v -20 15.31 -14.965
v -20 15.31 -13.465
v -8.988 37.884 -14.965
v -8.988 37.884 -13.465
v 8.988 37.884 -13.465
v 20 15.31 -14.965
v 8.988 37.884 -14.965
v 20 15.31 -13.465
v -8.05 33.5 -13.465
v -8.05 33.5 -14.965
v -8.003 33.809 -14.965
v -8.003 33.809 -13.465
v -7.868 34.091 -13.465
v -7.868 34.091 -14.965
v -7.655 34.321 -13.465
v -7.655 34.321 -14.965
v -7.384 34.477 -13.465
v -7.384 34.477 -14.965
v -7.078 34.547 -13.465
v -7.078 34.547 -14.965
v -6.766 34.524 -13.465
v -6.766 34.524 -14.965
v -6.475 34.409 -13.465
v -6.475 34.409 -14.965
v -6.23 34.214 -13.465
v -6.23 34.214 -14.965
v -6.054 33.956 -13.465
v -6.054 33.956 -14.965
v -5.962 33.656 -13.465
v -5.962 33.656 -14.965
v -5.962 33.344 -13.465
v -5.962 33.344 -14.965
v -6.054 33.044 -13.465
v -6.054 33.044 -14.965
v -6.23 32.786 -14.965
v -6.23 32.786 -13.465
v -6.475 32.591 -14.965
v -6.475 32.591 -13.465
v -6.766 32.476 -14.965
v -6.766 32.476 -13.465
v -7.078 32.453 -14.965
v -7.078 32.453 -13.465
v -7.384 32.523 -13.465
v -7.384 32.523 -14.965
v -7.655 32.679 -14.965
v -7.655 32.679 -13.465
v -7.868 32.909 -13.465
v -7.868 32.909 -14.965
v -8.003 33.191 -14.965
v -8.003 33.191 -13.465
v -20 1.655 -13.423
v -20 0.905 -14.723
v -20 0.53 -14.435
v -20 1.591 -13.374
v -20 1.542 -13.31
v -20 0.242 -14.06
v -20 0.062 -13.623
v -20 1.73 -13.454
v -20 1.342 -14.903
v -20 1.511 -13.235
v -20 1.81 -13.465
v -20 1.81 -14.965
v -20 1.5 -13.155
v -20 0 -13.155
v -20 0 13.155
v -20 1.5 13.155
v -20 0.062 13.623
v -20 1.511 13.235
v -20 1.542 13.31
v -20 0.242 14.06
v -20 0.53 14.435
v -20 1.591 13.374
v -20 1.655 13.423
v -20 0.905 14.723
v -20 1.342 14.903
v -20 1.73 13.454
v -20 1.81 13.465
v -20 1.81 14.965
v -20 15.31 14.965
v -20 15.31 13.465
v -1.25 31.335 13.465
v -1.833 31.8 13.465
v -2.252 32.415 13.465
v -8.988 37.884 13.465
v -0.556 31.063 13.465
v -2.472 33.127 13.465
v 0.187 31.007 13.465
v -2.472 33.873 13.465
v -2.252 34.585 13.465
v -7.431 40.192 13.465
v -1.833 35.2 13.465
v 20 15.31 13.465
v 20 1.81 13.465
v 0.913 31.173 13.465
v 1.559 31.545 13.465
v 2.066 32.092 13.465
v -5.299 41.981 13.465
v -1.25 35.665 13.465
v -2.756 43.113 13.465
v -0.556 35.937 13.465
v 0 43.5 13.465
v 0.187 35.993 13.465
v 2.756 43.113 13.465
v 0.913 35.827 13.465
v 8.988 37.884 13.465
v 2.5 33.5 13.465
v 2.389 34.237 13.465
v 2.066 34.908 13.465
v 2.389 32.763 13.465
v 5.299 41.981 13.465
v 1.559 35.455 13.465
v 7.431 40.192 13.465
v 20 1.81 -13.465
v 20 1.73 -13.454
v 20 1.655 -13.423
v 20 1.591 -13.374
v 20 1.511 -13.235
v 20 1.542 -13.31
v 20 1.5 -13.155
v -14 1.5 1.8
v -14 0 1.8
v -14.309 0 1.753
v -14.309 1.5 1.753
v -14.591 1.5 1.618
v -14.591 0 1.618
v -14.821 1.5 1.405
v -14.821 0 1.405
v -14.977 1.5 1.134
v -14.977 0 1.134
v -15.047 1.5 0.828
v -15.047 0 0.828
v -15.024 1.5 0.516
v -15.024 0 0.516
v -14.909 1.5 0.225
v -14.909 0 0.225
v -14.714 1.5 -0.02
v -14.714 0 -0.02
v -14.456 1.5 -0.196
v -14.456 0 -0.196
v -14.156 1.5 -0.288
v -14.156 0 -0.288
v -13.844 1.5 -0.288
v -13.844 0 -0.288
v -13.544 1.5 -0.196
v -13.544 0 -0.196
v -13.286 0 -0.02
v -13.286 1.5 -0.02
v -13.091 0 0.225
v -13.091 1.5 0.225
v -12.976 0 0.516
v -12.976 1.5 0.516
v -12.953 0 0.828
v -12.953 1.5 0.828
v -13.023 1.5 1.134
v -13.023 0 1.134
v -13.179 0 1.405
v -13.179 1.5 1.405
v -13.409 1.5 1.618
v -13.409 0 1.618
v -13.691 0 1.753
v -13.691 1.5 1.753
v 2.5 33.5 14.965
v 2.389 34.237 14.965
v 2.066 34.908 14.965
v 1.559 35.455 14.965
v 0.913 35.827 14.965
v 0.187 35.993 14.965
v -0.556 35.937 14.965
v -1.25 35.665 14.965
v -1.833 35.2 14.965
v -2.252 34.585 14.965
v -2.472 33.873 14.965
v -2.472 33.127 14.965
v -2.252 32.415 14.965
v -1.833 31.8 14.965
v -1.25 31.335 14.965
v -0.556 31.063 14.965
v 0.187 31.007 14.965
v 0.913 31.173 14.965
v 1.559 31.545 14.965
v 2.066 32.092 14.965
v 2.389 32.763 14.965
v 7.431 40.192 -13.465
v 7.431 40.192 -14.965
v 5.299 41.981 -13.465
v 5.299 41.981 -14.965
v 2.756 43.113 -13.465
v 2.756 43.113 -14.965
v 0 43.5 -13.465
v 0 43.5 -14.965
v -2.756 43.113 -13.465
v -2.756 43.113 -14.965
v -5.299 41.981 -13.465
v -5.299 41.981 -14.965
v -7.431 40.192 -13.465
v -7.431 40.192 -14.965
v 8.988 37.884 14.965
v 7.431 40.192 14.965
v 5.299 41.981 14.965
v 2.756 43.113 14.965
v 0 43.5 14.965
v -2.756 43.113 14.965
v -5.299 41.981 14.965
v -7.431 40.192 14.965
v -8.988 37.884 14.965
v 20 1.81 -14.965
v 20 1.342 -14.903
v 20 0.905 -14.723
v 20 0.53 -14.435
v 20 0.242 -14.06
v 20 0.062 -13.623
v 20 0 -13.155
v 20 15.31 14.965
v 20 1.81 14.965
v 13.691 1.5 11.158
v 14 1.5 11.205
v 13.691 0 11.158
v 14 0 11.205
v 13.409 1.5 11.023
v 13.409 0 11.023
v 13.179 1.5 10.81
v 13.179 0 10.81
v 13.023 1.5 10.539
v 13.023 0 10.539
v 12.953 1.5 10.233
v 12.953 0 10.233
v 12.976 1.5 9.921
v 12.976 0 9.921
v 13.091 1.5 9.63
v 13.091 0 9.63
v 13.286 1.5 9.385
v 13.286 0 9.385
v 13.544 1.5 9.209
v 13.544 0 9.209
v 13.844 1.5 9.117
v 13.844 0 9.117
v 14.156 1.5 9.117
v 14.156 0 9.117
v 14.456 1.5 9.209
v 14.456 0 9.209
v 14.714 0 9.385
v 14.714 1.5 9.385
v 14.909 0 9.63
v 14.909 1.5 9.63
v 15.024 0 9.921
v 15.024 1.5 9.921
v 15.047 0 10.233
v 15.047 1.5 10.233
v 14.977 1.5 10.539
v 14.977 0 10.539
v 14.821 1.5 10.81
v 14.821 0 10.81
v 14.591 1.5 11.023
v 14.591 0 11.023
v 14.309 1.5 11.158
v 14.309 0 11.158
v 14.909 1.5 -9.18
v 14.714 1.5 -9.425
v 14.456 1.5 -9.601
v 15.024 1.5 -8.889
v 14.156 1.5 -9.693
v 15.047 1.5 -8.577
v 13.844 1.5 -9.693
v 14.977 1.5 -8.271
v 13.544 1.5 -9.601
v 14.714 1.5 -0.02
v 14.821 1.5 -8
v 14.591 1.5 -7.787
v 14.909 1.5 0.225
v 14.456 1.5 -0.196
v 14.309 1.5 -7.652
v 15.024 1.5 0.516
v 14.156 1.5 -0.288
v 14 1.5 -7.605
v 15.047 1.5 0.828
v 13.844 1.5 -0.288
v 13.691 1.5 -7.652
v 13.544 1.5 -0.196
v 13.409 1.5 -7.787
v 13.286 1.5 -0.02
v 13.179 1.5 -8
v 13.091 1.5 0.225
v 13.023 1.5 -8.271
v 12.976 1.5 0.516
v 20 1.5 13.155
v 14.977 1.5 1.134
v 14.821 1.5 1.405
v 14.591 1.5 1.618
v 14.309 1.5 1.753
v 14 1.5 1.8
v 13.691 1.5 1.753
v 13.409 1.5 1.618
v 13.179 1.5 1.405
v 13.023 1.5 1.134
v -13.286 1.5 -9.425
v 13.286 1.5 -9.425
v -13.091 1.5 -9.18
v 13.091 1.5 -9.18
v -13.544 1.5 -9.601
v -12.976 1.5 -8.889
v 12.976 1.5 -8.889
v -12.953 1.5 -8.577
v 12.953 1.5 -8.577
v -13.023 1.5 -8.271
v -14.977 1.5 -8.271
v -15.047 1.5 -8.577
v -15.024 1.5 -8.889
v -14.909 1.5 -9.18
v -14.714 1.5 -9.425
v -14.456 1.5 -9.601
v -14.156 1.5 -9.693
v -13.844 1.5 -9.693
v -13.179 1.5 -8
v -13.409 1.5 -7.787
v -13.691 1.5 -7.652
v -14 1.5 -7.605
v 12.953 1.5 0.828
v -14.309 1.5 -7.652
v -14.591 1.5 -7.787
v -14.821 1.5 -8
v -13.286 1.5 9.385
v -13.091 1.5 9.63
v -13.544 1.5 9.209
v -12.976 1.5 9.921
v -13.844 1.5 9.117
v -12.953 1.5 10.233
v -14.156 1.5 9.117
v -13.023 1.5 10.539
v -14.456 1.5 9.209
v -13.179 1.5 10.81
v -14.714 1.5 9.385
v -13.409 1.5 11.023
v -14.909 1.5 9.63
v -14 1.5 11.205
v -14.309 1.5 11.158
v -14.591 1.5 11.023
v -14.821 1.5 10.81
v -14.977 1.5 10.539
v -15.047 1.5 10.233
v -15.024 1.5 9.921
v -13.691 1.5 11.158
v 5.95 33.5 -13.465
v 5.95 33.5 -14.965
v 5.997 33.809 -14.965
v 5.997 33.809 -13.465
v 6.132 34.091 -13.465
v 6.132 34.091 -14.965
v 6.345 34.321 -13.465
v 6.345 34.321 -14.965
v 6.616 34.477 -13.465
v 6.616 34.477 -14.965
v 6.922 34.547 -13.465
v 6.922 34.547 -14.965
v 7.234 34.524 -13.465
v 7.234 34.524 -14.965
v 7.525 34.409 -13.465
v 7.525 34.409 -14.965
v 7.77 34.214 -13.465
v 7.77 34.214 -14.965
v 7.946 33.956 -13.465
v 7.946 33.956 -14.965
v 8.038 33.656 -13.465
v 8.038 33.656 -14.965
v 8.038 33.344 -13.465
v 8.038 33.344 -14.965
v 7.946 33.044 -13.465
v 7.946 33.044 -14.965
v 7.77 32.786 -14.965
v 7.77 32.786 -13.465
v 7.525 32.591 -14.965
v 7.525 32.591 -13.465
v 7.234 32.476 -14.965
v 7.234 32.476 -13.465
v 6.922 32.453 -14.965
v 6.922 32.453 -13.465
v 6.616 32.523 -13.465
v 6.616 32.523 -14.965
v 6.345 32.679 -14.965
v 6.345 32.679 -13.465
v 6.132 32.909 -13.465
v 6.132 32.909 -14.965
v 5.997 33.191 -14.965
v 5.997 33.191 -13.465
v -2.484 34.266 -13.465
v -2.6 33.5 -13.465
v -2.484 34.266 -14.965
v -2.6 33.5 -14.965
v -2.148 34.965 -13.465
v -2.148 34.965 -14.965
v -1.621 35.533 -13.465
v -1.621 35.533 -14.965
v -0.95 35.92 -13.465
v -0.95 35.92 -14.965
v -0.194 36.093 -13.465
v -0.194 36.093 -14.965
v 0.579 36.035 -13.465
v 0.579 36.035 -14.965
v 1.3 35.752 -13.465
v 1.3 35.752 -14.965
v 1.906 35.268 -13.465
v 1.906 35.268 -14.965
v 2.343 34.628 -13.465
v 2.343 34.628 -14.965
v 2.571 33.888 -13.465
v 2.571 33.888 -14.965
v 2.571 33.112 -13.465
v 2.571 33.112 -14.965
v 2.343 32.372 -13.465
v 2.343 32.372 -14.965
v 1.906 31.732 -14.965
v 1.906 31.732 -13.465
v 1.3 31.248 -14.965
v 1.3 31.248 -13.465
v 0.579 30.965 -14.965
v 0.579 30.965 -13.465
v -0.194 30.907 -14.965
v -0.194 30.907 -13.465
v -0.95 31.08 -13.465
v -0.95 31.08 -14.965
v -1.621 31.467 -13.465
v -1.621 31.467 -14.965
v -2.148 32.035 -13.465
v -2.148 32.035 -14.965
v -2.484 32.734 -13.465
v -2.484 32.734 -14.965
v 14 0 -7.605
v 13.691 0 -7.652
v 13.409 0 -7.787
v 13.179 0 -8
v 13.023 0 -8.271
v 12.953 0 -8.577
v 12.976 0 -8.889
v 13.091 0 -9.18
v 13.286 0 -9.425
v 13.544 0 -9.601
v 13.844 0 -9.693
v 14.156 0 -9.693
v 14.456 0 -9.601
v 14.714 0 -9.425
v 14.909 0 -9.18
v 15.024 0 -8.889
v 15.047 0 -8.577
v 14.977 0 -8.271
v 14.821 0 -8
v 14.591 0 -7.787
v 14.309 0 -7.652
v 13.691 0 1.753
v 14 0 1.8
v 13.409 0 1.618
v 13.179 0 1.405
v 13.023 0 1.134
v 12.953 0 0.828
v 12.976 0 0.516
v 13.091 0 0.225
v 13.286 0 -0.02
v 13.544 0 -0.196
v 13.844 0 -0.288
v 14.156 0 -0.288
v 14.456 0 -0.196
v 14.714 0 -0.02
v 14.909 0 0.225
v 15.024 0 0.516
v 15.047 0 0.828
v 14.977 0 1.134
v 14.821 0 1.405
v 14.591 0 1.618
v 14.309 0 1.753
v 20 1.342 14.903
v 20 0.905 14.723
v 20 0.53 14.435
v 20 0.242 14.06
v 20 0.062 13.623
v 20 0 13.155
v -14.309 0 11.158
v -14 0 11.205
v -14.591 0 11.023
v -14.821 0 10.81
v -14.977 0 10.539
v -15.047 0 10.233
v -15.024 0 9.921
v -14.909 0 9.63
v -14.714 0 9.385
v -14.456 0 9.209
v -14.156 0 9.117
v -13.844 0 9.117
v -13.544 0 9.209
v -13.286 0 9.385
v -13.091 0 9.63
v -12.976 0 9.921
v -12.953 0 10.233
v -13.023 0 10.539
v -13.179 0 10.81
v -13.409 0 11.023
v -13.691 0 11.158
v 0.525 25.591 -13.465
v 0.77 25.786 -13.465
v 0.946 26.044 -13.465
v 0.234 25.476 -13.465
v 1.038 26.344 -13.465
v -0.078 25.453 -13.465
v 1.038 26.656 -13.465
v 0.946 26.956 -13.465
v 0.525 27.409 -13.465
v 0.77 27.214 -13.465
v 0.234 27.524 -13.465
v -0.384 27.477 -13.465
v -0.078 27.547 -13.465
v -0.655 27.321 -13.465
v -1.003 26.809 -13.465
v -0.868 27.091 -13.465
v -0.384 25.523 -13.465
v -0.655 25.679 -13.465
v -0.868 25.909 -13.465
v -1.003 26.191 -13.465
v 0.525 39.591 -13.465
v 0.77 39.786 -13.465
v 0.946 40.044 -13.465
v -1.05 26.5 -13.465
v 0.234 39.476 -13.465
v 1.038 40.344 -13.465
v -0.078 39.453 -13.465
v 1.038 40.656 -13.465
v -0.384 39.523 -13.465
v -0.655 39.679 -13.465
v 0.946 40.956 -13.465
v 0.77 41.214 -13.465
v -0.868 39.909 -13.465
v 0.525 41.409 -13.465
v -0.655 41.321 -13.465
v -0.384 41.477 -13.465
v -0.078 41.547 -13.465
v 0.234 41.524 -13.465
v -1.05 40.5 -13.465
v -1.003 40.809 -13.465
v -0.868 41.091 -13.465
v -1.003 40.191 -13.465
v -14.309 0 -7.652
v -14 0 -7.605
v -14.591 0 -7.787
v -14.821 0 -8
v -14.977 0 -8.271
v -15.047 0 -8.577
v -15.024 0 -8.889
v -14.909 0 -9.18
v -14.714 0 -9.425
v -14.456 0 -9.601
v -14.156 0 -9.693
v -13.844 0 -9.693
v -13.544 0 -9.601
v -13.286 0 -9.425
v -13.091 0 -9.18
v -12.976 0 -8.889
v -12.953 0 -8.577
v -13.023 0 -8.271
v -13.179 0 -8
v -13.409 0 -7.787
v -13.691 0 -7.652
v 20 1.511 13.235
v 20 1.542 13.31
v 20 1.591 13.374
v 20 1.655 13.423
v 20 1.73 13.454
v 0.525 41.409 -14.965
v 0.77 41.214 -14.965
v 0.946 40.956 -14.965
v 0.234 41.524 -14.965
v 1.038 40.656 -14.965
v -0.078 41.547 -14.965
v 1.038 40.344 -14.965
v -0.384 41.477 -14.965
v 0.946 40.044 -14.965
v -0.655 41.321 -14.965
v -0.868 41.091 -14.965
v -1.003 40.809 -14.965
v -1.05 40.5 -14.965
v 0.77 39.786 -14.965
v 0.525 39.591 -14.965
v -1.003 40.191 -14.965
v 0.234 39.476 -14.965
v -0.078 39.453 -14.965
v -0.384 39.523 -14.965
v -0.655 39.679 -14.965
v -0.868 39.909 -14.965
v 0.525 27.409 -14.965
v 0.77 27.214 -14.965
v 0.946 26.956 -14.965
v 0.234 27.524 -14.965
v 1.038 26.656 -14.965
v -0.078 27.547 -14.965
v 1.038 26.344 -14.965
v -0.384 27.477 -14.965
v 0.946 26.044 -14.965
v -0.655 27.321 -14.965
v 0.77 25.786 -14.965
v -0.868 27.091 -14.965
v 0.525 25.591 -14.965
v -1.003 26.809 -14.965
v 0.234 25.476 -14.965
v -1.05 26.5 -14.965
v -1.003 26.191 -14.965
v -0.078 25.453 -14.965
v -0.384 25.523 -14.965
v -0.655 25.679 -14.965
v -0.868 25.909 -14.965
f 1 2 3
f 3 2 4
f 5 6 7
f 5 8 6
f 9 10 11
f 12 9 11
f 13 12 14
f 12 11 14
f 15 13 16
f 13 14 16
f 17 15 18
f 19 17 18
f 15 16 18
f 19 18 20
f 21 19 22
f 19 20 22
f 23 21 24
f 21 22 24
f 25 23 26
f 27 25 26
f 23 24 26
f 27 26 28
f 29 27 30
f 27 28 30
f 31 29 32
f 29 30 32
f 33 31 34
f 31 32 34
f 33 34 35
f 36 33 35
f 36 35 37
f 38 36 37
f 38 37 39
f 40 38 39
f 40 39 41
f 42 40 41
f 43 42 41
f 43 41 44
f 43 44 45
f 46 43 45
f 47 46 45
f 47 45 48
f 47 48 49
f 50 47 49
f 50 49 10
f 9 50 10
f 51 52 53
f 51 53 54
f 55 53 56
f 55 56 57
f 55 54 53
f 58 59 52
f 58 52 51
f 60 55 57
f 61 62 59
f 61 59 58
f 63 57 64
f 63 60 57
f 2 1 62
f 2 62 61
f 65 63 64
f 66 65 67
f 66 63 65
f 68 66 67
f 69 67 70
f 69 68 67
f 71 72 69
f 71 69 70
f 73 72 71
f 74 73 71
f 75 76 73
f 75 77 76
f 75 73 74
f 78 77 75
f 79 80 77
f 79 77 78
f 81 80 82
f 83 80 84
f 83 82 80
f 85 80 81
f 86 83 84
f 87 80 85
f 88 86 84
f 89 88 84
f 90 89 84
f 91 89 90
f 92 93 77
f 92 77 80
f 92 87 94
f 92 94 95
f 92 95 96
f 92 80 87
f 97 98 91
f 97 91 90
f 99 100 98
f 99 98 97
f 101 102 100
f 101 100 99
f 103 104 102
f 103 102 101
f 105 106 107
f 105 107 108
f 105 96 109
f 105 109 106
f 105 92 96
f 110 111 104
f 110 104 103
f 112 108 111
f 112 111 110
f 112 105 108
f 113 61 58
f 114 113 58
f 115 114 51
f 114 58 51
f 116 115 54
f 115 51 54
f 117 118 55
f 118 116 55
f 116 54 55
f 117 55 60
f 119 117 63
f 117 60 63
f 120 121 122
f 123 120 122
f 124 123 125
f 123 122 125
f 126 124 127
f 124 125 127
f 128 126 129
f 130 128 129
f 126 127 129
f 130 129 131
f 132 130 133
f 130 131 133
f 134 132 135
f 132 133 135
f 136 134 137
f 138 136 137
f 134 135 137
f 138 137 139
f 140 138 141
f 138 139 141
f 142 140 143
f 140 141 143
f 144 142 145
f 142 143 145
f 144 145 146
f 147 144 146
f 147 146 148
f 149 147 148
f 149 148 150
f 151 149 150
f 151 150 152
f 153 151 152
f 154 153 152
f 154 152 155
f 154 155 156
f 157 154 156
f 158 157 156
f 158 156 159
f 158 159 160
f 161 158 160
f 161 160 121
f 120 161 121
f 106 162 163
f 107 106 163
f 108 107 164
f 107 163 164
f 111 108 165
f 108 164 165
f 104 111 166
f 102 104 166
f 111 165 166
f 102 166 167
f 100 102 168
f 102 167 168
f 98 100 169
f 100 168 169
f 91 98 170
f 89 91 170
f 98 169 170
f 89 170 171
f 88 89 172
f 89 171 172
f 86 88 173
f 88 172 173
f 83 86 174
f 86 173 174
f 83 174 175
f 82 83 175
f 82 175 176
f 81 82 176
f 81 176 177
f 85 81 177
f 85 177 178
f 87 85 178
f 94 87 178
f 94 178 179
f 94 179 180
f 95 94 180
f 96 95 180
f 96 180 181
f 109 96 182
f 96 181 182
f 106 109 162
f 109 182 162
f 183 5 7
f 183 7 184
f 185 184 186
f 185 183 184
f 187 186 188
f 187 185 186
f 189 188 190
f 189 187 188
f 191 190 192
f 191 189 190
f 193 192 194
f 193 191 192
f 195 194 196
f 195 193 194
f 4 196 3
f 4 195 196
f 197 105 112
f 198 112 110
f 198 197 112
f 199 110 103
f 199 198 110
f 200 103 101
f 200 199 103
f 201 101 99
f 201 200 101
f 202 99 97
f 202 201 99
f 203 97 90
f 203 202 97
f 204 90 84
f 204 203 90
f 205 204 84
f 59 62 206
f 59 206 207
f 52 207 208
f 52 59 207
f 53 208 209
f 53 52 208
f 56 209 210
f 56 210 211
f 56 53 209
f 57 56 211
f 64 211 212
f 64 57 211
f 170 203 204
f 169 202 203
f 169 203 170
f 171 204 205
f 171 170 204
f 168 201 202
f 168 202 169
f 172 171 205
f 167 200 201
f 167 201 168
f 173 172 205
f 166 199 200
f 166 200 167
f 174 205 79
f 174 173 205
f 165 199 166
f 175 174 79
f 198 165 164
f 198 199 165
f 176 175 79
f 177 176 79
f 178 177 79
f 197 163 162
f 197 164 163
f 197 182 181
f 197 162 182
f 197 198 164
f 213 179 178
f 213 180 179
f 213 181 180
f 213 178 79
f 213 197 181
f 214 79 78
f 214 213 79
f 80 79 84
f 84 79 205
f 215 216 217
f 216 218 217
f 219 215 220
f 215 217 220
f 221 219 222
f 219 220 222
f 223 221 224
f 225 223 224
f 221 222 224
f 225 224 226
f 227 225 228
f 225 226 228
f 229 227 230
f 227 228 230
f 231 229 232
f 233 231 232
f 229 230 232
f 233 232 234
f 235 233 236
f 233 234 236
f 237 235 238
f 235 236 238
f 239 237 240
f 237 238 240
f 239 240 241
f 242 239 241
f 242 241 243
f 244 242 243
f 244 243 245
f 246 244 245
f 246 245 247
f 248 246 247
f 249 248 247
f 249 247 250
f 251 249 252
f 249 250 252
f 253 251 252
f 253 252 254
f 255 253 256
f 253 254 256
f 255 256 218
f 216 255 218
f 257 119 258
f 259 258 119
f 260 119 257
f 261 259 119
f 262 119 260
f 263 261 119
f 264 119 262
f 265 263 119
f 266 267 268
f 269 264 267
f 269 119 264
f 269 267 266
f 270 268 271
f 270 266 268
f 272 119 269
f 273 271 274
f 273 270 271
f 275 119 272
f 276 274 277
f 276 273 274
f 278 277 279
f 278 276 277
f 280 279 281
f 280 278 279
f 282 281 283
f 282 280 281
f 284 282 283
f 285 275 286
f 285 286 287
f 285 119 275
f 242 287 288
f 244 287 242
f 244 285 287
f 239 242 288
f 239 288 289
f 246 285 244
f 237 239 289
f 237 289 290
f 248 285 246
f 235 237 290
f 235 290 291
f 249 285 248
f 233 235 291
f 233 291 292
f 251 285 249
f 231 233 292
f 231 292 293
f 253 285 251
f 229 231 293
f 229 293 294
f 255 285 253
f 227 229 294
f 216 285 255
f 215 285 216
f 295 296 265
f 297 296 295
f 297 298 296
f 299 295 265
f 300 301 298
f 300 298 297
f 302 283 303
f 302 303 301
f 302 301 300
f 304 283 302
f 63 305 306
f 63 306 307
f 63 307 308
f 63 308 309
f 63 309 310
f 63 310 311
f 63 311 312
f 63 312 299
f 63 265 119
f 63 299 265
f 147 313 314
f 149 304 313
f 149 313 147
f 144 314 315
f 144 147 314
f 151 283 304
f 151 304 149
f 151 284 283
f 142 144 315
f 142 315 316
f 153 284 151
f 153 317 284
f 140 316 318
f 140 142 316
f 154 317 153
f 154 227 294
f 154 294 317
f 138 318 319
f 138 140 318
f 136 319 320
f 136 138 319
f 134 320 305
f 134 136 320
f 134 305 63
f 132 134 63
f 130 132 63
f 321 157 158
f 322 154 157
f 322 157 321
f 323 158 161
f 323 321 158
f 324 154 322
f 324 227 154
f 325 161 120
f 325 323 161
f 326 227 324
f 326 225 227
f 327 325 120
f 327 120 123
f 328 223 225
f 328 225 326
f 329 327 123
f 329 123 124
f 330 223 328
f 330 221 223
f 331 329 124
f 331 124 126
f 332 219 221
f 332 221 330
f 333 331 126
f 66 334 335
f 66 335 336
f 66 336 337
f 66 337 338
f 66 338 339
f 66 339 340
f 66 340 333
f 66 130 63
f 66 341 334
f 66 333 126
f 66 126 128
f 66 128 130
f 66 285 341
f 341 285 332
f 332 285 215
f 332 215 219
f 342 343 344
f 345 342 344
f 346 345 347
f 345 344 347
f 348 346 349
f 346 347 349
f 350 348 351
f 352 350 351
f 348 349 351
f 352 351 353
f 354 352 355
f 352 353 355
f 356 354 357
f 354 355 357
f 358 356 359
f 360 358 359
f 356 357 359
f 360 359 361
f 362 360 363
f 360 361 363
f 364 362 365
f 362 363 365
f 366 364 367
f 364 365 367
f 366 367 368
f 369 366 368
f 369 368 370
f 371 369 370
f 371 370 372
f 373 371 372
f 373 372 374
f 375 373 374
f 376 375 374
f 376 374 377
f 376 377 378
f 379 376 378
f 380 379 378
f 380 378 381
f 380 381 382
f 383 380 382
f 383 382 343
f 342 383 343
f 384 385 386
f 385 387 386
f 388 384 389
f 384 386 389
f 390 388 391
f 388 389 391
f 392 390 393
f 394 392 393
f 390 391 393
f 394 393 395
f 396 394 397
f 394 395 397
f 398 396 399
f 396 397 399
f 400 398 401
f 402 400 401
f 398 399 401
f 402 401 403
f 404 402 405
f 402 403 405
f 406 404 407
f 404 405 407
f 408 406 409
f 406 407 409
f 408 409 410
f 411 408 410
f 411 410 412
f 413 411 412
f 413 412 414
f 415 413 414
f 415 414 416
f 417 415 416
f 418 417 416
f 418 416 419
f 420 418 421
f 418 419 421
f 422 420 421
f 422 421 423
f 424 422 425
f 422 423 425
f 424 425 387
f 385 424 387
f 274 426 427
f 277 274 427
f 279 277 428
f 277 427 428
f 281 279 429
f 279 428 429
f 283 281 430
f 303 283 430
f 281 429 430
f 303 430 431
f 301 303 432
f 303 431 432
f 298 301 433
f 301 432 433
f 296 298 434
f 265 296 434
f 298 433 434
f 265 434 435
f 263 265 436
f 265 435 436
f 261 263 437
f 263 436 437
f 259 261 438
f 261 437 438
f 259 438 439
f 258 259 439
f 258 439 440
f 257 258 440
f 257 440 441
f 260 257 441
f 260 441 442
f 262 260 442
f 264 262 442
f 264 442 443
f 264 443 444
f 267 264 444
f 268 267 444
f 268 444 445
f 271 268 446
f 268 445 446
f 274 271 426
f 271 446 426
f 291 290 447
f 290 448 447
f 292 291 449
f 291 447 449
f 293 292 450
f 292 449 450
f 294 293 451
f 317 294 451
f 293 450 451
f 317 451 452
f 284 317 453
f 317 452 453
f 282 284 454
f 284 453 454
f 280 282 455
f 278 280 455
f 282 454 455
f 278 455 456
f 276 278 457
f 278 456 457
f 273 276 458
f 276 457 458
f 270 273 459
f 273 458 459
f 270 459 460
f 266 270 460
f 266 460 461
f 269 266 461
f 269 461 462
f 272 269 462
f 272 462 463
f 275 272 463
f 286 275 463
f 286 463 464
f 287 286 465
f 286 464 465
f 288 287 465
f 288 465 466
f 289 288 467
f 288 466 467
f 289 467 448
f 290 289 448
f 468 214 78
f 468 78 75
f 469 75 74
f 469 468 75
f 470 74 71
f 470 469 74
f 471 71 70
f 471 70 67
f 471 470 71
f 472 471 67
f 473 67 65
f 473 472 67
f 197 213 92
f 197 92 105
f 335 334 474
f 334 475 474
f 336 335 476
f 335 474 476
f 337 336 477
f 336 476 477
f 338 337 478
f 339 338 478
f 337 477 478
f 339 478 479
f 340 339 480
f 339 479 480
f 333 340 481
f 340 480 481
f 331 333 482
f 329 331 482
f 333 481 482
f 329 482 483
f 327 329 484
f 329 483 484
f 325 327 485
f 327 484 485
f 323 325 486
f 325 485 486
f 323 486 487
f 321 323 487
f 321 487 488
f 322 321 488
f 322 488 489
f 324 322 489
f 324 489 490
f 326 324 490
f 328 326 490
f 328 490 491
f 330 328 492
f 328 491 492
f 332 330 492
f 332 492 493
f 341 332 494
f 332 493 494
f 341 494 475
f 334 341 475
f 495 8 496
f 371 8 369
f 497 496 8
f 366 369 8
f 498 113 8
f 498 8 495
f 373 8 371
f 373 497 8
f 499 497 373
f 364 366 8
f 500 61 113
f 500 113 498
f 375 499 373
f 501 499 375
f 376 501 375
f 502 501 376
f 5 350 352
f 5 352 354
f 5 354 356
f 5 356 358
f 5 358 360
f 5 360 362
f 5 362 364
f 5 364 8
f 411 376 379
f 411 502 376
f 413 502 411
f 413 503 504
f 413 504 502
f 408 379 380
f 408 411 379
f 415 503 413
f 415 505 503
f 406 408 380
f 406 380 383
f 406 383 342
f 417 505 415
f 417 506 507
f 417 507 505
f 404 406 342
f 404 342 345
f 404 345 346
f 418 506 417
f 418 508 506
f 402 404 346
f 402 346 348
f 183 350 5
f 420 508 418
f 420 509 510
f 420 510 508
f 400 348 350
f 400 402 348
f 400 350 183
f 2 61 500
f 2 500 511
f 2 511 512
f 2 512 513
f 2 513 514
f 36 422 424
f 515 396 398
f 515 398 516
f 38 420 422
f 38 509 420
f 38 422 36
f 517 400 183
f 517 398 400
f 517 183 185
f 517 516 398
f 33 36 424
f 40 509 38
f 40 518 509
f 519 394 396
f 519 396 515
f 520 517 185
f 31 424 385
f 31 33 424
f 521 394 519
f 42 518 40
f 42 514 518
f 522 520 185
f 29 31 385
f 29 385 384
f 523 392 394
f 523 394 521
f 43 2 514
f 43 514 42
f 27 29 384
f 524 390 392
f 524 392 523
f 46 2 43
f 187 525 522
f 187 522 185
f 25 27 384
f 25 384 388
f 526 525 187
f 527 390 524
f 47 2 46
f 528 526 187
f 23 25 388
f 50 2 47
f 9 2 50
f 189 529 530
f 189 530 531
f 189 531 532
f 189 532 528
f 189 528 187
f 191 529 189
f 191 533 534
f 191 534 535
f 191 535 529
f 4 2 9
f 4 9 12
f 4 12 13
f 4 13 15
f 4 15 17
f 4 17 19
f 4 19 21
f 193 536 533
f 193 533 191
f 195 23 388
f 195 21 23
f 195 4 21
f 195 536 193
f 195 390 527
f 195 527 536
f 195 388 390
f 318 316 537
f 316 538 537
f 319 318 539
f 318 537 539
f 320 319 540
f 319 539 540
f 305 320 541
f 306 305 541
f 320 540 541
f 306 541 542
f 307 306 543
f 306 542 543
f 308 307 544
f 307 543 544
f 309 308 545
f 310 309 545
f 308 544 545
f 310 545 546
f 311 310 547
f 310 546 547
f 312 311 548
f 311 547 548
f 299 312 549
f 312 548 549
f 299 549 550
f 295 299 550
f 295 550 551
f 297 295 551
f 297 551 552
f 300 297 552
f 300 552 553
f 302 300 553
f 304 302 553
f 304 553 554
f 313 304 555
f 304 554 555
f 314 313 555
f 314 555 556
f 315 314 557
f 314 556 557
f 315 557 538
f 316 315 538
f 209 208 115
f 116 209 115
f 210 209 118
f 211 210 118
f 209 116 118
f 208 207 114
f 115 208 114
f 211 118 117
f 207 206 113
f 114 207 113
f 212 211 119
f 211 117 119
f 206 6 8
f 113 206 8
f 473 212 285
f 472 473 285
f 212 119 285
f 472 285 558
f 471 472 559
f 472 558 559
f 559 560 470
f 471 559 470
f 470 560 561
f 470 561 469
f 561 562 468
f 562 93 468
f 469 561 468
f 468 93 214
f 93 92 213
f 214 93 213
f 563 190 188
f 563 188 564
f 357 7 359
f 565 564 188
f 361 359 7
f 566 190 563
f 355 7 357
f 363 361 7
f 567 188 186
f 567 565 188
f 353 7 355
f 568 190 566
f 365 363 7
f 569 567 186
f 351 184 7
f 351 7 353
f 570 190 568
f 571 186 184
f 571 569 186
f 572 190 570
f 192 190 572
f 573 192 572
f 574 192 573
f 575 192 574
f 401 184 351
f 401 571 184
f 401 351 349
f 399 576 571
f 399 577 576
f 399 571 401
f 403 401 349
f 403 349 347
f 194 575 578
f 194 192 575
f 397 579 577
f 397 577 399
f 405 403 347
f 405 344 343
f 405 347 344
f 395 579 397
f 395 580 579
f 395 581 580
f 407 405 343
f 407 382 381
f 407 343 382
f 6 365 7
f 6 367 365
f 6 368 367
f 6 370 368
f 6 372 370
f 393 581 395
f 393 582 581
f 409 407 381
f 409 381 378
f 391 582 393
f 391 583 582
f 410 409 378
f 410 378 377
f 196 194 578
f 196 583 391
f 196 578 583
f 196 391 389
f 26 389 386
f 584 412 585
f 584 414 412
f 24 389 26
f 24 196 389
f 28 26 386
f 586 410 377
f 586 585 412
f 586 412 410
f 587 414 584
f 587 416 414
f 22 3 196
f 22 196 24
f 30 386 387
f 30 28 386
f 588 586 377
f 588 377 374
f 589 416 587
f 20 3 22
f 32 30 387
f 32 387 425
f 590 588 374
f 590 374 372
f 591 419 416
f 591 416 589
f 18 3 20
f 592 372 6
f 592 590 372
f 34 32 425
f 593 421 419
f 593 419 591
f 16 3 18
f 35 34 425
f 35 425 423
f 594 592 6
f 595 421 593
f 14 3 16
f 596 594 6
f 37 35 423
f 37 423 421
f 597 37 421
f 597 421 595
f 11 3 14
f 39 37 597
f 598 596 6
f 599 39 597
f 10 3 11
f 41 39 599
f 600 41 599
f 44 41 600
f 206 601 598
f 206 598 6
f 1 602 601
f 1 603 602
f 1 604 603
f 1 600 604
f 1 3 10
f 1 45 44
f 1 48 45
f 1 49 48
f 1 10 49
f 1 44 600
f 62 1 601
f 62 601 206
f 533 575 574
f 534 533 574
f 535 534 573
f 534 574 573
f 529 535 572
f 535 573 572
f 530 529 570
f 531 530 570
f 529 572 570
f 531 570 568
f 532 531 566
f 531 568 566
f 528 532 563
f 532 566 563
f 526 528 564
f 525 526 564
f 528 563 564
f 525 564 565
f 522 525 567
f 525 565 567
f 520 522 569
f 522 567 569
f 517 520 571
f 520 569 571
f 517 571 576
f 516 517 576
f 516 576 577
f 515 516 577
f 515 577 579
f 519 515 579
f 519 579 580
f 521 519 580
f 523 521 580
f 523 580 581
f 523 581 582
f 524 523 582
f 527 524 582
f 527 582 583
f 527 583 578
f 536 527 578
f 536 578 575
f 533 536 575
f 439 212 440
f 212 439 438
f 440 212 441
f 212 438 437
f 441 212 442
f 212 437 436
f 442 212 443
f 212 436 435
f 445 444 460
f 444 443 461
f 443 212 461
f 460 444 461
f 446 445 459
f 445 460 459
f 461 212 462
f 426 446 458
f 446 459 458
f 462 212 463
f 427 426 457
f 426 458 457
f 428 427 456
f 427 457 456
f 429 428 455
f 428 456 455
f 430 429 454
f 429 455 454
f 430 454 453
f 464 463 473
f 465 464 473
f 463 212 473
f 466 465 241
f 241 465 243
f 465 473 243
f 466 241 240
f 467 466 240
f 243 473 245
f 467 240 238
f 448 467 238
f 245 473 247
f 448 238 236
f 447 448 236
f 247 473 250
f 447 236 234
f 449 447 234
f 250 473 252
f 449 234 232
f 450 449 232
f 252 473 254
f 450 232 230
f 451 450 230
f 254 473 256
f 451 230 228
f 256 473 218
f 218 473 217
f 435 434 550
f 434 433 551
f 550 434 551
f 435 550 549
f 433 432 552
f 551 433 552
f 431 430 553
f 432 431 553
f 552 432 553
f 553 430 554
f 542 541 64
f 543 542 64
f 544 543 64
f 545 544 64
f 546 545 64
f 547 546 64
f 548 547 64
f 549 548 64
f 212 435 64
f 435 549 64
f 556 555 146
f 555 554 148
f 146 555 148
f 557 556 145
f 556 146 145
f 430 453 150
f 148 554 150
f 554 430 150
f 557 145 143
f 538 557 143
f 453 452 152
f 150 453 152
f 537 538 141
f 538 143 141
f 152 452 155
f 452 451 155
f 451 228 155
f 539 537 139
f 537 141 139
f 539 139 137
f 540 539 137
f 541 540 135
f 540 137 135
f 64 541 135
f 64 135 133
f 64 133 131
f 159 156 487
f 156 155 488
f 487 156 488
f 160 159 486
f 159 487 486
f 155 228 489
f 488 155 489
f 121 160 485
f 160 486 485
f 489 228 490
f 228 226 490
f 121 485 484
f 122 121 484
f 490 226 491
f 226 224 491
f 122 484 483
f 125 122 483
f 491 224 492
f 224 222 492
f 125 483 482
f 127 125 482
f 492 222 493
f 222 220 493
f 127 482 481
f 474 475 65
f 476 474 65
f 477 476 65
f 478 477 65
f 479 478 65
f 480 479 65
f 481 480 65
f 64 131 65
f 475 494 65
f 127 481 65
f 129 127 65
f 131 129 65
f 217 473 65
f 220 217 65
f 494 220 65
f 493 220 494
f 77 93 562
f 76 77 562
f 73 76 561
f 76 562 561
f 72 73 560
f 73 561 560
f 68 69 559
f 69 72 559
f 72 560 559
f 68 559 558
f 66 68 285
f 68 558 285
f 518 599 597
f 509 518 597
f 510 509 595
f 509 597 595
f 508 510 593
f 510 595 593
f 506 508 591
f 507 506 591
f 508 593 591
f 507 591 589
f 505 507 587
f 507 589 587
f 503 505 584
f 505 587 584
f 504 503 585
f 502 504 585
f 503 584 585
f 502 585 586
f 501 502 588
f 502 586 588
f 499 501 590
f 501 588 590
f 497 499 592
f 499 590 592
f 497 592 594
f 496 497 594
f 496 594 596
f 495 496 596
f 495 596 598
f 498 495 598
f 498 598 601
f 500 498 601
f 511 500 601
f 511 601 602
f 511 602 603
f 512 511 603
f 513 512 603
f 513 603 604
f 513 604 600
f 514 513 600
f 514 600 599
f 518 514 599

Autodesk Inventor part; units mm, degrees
ref_plane "YZ Plane" through (0, 0, 0) normal (1, 0, 0) x (0, 1, 0)
ref_plane "XZ Plane" through (0, 0, 0) normal (0, 1, 0) x (-1, 0, 0)
ref_plane "XY Plane" through (0, 0, 0) normal (0, 0, 1) x (1, 0, 0)
sketch "Sketch1" plane through (0, 0, 0) normal (0, 1, 0) x (-1, 0, 0)
  line L0 (20, 14.965) -> (-20, 14.965)
  line L1 (-20, 14.965) -> (-20, -14.965)
  line L2 (-20, -14.965) -> (20, -14.965)
  line L3 (20, -14.965) -> (20, 14.965)
  point P0 (0, 0)
  dimension "d0" = 29.93
  dimension "d1" = 40
  dimension "d2" = 20
  dimension "d3" = 14.965
extrude "Plate1" add sketch "Sketch1" along normal blind 1.5
sketch "Sketch2" plane through (-20, 0, -13.465) normal (0, 0, -1) x (-1, 0, 0)
  line L0 (-40, 0) -> (0, 0)
  line L1 (0, 0) -> (0, 43.5)
  line L2 (0, 43.5) -> (-40, 43.5)
  line L3 (-40, 43.5) -> (-40, 0)
edge flange "Flange1" height 43.5 angle 90 thickness 1.5 bend radius 0.31 thickness toward (0, 0, -1) relief tear relief width 1.5 relief depth 0.75 corner gap 0.31 corner form 0 edges at (0, 1.5, -14.965) (0, 1.5, 14.965) wall of the first edge with corners at (20, 0, -13.465) (-20, 0, -13.465) (-20, 43.5, -13.465) (20, 43.5, -13.465)
bend "Bend1"
corner "Corner1"
sketch "Sketch3" plane through (-20, 43.5, 14.965) normal (0, 0, 1) x (1, 0, 0)
  line L0 (0, 0) -> (40, 0) projected
  line L1 (0, -41.69) -> (0, 0) projected
  circle A0 centre (20, -10) radius 10
  line L2 (0, -28.19) -> (40, -28.19)
  line L3 (40, -28.19) -> (40, -38.19)
  line L4 (40, -38.19) -> (0, -38.19)
  line L5 (0, -38.19) -> (0, -28.19)
  line L6 (40, -28.19) -> (28.9876, -5.6156)
  line L7 (0, -28.19) -> (11.0124, -5.6156)
  line L8 (0, 0) -> (40, 0)
  line L9 (40, 0) -> (40, -35)
  line L10 (40, -35) -> (0, -35)
  line L11 (0, -35) -> (0, 0)
  point P0 (20, -43.5)
  point P1 (20, 0)
  point P2 (0, -28.19)
  point P3 (0, -35)
  point P4 (30, -10)
  dimension "d15" = 10
  dimension "d16" = 0
  dimension "d17" = 20
  dimension "d18" = 18.19
  dimension "d19" = 0
  dimension "d20" = 40
  dimension "d21" = 10
  dimension "d22" = 35
extrude "Extrusion1" cut sketch "Sketch3" against normal blind 35 contours L0 A0 L7 L1 | L0 L9 L6 A0
sketch "Sketch4" plane through (20, 1.81, -14.965) normal (0, 0, -1) x (-1, 0, 0)
  arc A0 (28.9876, 36.0744) -> (11.0124, 36.0744) centre (20, 31.69) ccw projected
  circle A1 centre (20, 31.69) radius 2.6
  circle A2 centre (13, 31.69) radius 1.05
  circle A3 centre (27, 31.69) radius 1.05
  circle A4 centre (20, 38.69) radius 1.05
  circle A5 centre (20, 24.69) radius 1.05
  point P0 (20, -1.81)
  dimension "d25" = 5.2
  dimension "d26" = 0
  dimension "d27" = 7
  dimension "d28" = 2.1
  dimension "d29" = 7
  dimension "d30" = 0
  dimension "d31" = 2.1
  dimension "d32" = 0
  dimension "d33" = 7
  dimension "d34" = 2.1
  dimension "d35" = 7
  dimension "d36" = 0
  dimension "d37" = 2.1
extrude "Extrusion2" cut sketch "Sketch4" against normal blind 1.5
sketch "Sketch5" plane through (-20, 1.81, 14.965) normal (0, 0, 1) x (1, 0, 0)
  arc A0 (28.9876, 36.0744) -> (11.0124, 36.0744) centre (20, 31.69) ccw projected
  circle A1 centre (20, 31.69) radius 2.5
  point P0 (20, -1.81)
  dimension "d40" = 5
extrude "Extrusion3" cut sketch "Sketch5" against normal blind 1.5
sketch "Sketch6" plane through (0, 1.5, 0) normal (0, 1, 0) x (1, 0, 0)
  circle A0 centre (-14, -10.155) radius 1.05 projected
  circle A1 centre (-14, -0.75) radius 1.05 projected
  circle A2 centre (-14, 8.655) radius 1.05 projected
  circle A3 centre (14, -10.155) radius 1.05 projected
  circle A4 centre (14, -0.75) radius 1.05 projected
  circle A5 centre (14, 8.655) radius 1.05 projected
  point P0 (0, 0)
hole "Hole1" at (14, 1.5, -8.655) at (14, 1.5, 0.75) at (14, 1.5, 10.155) at (-14, 1.5, 10.155) at (-14, 1.5, 0.75) at (-14, 1.5, -8.655) direction (0, -1, 0) diameter 2.1 depth 1.5
equation "\"d48\" = Thickness"
equation "\"d4\" = Thickness"
equation "\"d5\" = BendReliefWidth"
equation "\"d6\" = BendReliefDepth"
equation "\"d7\" = MinimumRemnant"
equation "\"d8\" = TransitionRadius"
equation "\"d11\" = BendRadius"
equation "\"d12\" = CornerReliefSize"
equation "\"d13\" = GapSize"
equation "\"d14\" = JacobiRadiusSize"
equation "\"BendReliefWidth\" = Thickness"
equation "\"BendReliefDepth\" = 0.5 * Thickness"
equation "\"CornerReliefSize\" = 4 * Thickness"
equation "\"MinimumRemnant\" = 2 * Thickness"
equation "\"TransitionRadius\" = BendRadius"
equation "\"JacobiRadiusSize\" = BendRadius"
equation "\"GapSize\" = Thickness"
equation "\"Thickness\" = 1.5"
equation "\"BendRadius\" = 0.31"
properties part number "partpart" material "Aluminum 6061-AHC"
